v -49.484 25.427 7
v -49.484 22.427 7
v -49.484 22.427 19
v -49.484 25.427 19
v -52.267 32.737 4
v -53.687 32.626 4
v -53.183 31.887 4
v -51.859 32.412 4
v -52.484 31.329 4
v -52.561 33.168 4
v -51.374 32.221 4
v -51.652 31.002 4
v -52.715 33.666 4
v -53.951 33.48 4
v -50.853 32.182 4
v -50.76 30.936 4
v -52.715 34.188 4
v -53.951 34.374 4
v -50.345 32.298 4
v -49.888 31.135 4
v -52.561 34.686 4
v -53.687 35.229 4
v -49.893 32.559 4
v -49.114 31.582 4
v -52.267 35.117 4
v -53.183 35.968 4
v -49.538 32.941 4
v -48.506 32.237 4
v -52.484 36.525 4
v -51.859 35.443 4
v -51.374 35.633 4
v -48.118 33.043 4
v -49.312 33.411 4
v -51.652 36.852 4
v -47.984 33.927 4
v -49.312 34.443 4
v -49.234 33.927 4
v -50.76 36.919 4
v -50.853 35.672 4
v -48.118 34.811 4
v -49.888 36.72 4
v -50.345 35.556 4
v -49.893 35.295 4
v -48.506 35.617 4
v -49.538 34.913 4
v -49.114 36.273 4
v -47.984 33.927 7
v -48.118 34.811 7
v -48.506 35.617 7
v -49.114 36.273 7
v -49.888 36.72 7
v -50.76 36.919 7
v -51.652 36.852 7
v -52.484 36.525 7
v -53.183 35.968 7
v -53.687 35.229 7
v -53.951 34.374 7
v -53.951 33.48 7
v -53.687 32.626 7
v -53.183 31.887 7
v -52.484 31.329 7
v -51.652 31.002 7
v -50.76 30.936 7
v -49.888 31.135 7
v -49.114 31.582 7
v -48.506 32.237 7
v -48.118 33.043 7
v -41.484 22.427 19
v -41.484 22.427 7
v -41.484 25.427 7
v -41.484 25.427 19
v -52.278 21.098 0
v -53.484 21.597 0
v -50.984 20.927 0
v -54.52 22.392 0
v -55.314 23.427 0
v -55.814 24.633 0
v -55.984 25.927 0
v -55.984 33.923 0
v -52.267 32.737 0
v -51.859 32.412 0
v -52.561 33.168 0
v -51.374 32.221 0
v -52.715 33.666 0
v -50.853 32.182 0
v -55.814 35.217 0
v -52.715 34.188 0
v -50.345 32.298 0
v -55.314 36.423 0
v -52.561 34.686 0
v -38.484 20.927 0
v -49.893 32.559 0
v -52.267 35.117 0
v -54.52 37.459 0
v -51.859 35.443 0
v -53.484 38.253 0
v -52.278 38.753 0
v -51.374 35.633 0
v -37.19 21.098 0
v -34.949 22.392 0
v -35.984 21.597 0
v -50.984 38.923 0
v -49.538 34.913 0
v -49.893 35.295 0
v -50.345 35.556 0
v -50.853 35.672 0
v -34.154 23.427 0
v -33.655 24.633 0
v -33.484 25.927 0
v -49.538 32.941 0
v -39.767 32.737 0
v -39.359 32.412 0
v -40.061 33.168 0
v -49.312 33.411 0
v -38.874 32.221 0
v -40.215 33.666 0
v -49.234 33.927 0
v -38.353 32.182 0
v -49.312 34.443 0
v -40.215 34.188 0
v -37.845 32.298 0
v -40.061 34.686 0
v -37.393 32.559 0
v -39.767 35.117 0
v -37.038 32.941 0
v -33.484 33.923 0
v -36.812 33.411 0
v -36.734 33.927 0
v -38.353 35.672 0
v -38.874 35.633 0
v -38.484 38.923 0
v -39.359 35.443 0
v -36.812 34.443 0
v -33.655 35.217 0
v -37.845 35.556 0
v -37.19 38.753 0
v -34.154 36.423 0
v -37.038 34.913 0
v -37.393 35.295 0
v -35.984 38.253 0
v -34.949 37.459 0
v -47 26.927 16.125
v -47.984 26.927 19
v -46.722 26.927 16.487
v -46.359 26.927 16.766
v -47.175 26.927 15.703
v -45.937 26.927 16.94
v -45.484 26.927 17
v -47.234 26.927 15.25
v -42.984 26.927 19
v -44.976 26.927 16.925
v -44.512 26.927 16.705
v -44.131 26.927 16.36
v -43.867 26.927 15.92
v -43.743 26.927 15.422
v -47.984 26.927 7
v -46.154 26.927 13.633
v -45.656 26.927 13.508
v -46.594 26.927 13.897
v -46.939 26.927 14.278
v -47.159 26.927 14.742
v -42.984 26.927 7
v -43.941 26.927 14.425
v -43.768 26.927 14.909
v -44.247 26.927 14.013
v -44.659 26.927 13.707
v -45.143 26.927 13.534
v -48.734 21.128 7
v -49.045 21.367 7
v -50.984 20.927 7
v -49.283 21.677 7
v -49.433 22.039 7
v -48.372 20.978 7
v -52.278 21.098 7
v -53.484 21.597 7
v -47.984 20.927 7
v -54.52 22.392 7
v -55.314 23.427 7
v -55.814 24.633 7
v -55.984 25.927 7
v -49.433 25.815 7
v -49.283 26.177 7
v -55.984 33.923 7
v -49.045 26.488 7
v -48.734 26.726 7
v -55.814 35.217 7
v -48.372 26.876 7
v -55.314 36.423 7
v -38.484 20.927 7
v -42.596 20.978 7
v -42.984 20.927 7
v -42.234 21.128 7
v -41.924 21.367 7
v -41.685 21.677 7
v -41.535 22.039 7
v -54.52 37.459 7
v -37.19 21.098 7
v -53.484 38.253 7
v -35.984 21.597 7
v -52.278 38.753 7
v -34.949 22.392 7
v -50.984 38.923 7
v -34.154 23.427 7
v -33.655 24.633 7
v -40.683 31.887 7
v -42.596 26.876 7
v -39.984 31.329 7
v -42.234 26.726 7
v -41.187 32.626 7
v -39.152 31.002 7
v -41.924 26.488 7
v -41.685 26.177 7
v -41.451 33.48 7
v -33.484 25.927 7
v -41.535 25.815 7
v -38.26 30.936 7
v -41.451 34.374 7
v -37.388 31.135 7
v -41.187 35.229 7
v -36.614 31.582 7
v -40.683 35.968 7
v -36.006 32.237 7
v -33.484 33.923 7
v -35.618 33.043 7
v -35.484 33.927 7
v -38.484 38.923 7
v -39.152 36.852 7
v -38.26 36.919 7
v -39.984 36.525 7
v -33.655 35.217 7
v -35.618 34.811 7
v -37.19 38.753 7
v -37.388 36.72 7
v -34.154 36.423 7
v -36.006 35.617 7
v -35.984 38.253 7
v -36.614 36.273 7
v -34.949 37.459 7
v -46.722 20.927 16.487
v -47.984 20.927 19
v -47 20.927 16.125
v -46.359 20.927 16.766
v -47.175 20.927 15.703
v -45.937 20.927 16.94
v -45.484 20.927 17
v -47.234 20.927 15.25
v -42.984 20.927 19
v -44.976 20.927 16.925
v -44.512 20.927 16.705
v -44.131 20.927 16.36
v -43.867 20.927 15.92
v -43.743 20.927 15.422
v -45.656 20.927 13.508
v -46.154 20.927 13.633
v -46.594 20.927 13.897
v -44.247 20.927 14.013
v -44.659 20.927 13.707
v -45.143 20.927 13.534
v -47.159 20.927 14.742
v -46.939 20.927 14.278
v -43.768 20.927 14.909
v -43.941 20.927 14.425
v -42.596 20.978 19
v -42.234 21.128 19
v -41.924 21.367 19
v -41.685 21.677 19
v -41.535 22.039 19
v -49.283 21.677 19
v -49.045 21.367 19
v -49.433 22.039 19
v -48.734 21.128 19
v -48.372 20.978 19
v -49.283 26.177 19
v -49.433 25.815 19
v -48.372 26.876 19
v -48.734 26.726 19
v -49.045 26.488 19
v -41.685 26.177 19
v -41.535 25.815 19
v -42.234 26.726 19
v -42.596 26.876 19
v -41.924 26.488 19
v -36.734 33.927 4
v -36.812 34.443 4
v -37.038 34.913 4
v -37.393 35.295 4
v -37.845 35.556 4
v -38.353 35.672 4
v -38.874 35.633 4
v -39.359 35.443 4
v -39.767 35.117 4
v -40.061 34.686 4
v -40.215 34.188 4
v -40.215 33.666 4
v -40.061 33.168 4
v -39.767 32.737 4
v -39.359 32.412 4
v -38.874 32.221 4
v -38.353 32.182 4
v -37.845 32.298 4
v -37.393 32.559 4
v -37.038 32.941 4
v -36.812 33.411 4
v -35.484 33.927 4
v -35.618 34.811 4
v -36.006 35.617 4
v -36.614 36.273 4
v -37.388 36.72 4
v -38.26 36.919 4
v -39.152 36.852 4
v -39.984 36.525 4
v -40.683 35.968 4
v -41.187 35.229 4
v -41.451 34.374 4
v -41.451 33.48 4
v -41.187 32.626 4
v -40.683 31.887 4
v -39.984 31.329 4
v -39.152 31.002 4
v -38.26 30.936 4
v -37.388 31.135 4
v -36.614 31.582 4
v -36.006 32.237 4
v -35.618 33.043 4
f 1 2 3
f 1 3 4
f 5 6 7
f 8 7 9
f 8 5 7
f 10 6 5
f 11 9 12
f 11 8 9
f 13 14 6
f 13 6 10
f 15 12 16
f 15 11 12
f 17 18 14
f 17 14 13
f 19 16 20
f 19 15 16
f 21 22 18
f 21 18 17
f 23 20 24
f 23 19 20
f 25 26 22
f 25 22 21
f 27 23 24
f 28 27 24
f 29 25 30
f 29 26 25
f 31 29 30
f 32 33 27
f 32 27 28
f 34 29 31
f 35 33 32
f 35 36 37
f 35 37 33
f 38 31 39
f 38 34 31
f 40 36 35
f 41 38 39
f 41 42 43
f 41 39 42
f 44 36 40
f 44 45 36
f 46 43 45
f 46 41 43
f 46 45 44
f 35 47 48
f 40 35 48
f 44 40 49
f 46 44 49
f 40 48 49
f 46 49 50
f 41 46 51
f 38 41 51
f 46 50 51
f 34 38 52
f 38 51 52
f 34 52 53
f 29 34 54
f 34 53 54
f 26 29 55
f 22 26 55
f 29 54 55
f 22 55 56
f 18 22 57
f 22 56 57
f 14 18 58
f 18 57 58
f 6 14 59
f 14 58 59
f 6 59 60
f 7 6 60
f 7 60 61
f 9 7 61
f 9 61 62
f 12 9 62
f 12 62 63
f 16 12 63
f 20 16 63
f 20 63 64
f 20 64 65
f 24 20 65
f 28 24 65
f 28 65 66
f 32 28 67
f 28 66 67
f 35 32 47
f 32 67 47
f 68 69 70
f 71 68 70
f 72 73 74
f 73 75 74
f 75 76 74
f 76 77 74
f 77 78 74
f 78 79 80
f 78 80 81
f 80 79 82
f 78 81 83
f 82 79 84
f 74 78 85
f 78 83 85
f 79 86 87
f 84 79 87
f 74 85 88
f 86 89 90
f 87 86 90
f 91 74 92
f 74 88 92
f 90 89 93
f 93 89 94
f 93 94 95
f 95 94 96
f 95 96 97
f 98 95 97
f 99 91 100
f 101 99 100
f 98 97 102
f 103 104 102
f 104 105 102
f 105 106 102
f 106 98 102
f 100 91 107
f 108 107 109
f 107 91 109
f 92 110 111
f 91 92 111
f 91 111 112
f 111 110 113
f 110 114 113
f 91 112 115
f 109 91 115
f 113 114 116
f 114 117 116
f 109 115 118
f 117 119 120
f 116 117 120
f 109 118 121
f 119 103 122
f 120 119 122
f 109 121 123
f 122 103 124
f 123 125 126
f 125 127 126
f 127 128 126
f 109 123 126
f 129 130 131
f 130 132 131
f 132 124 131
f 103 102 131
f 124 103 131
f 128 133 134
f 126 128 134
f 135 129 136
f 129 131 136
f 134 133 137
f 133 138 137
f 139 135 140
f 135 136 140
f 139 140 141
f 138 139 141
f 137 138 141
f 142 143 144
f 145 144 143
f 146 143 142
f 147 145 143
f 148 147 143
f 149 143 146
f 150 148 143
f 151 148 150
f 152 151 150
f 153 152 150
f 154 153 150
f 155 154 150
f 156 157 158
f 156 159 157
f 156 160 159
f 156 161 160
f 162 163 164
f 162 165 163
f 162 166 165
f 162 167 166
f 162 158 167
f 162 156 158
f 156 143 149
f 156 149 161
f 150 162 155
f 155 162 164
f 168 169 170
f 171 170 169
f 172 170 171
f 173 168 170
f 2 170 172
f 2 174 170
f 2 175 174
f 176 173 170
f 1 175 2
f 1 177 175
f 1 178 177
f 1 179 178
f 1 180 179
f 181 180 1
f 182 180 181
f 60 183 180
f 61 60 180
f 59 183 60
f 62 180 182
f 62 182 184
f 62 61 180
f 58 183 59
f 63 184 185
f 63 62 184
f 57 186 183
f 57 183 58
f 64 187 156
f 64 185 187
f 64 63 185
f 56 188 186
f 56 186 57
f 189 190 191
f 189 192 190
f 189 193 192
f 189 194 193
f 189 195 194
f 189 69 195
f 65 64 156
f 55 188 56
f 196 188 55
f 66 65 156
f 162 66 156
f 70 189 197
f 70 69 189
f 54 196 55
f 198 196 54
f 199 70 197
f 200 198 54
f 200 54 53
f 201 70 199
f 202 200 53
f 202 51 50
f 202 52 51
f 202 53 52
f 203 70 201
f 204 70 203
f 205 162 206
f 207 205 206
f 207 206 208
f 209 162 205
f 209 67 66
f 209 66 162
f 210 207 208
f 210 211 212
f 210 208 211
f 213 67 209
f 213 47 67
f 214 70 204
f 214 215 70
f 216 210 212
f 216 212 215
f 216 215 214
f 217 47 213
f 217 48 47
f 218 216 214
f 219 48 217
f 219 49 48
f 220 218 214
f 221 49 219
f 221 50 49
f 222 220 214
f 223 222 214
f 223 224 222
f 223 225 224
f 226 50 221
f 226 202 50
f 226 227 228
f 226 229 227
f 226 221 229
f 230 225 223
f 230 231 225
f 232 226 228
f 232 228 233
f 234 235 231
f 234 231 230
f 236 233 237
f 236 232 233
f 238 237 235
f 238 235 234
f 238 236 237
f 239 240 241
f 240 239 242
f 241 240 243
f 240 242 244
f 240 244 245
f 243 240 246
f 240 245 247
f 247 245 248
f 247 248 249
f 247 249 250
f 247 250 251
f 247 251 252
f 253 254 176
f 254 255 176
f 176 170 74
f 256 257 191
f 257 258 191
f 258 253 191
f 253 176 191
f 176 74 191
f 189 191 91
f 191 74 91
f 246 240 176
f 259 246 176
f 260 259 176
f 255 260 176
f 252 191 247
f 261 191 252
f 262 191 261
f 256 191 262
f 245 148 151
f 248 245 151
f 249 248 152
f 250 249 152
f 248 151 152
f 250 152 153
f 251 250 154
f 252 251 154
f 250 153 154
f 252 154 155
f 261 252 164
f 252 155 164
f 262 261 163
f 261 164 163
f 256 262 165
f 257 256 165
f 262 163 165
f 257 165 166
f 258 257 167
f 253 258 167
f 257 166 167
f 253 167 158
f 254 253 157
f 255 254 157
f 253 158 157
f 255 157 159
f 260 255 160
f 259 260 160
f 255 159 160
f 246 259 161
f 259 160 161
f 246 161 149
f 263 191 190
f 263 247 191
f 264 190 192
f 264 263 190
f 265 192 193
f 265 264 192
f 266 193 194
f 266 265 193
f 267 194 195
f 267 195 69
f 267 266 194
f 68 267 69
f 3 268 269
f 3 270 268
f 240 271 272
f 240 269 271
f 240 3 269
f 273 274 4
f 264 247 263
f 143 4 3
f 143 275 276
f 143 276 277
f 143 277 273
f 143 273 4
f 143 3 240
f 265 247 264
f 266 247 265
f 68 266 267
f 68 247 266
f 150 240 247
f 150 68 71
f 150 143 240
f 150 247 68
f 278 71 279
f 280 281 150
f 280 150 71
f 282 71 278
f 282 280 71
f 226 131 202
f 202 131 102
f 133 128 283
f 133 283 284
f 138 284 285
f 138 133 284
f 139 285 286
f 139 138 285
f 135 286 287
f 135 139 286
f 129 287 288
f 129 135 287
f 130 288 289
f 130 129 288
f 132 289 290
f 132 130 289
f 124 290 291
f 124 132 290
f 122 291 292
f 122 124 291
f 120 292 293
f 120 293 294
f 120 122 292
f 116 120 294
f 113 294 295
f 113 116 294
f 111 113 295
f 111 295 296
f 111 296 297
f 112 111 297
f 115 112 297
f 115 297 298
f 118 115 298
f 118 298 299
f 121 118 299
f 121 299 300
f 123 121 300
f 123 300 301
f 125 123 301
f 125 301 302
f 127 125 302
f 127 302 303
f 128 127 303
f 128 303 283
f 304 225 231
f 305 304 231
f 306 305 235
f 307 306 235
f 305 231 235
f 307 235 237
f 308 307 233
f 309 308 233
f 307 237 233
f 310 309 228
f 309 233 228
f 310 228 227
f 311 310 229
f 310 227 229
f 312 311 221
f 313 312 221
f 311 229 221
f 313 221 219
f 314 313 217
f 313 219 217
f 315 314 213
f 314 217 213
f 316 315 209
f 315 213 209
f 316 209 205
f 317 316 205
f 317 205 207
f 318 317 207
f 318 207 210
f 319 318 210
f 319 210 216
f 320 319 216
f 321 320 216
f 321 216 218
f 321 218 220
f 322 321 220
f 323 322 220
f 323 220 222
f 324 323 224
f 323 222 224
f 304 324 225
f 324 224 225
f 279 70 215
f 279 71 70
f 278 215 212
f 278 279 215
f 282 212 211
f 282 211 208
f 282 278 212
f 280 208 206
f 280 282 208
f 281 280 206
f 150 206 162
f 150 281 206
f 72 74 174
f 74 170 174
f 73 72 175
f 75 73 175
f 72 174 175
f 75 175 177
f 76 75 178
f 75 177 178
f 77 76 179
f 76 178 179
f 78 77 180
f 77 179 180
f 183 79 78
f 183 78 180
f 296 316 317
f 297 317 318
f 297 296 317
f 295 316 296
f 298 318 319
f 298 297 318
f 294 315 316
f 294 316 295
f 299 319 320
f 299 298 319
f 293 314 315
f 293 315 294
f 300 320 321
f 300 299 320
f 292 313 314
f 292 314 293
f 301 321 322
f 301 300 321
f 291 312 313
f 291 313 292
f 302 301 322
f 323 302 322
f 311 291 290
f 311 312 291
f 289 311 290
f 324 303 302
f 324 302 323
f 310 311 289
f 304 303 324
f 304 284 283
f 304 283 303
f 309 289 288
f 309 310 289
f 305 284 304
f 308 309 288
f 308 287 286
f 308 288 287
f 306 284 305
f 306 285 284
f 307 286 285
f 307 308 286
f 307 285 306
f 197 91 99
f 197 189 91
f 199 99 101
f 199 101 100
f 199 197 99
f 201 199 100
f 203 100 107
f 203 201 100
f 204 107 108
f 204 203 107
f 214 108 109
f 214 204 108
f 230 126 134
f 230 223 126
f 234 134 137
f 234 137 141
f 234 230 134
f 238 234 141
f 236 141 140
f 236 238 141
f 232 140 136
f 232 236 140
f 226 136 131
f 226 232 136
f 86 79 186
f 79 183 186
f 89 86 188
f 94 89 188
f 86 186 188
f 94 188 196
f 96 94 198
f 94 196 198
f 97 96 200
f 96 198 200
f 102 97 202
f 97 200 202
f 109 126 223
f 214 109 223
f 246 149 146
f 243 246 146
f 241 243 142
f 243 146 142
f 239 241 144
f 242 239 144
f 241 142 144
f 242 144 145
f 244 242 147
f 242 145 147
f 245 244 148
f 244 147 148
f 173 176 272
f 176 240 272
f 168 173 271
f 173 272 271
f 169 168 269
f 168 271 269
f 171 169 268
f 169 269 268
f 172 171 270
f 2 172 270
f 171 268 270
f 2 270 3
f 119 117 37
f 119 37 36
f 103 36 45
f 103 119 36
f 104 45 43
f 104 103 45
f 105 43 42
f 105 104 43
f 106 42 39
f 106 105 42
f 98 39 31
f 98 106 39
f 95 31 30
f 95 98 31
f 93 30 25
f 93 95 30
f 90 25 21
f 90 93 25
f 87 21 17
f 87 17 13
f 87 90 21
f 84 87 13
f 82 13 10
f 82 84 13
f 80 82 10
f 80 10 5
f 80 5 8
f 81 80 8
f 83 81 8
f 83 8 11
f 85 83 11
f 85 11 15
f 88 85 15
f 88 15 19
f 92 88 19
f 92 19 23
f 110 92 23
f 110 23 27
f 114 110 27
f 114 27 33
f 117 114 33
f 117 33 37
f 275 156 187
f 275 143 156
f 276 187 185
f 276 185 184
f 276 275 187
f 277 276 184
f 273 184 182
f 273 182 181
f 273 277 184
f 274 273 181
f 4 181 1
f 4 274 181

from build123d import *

# Parameters (mm, degrees)
F0_R      = 3
F0_R_2    = 1.75
F1_DEPTH  = 7
F3_DEPTH  = 5
F4_W      = 8
F4_H      = 6
F5_DEPTH  = 12
F6_R      = 1.5
F2_R      = 3
F2_R_2    = 1.75
F7_DEPTH  = 3
F8_R      = 5
F10_DEPTH = 25


# Not quite as in the source:
# - a feature names something its author has since deleted; it is built from what else it names


with BuildPart() as f1:
    # F0 (on Top) → F1 (new body)
    with BuildSketch(Plane.XY):
        with BuildLine():
            ThreePointArc((-51.1365796847, 36.9232990628), (-48.9174910641, 36.1016771789), (-47.9842549264, 33.9271686971))
            ThreePointArc((-47.9842549264, 33.9271686971), (-50.9842549264, 30.9271686971), (-53.9842549264, 33.9271686971))
            Line((-53.9842549264, 33.9271686971), (-55.9842549264, 33.9271686971))
            Line((-55.9842549264, 33.9271686971), (-55.9842549264, 28.9271686971))
            Line((-55.9842549264, 28.9271686971), (-35.9842549264, 28.9271686971))
            Line((-35.9842549264, 28.9271686971), (-35.9842549264, 25.9271686971))
            Line((-35.9842549264, 25.9271686971), (-33.4842549264, 25.9271686971))
            Line((-33.4842549264, 25.9271686971), (-33.4842549264, 33.9271686971))
            Line((-33.4842549264, 33.9271686971), (-33.4842549264, 38.9232990628))
            Line((-33.4842549264, 38.9232990628), (-35.9842549264, 38.9232990628))
            Line((-35.9842549264, 38.9232990628), (-51.1365796847, 38.9232990628))
            Line((-51.1365796847, 38.9232990628), (-51.1365796847, 36.9232990628))
        make_face()
        with Locations((-38.4842549264, 33.9271686971)):
            Circle(F0_R, mode=Mode.SUBTRACT)
        with BuildLine():
            ThreePointArc((-53.9842549264, 33.9271686971), (-53.1587634082, 35.9939325595), (-51.1365796847, 36.9232990628))
            Line((-51.1365796847, 36.9232990628), (-51.1365796847, 38.9232990628))
            Line((-51.1365796847, 38.9232990628), (-55.9842549264, 38.9232990628))
            Line((-55.9842549264, 38.9232990628), (-55.9842549264, 33.9271686971))
            Line((-55.9842549264, 33.9271686971), (-53.9842549264, 33.9271686971))
        make_face()
        Polygon((-35.9842549264, 28.9271686971), (-55.9842549264, 28.9271686971), (-55.9842549264, 25.9271686971), (-53.9842549264, 25.9271686971), (-43.9842549264, 25.9271686971), (-35.9842549264, 25.9271686971), align=None)
        with BuildLine():
            ThreePointArc((-53.9842549264, 33.9271686971), (-50.9842549264, 30.9271686971), (-47.9842549264, 33.9271686971))
            ThreePointArc((-47.9842549264, 33.9271686971), (-48.9174910641, 36.1016771789), (-51.1365796847, 36.9232990628))
            ThreePointArc((-51.1365796847, 36.9232990628), (-53.1587634082, 35.9939325595), (-53.9842549264, 33.9271686971))
        make_face()
        with Locations((-50.9842549264, 33.9271686971)):
            Circle(F0_R_2, mode=Mode.SUBTRACT)
        with Locations((-38.4842549264, 33.9271686971)):
            Circle(F0_R)
        with Locations((-38.4842549264, 33.9271686971)):
            Circle(F0_R_2, mode=Mode.SUBTRACT)
    extrude(amount=F1_DEPTH)

    # F3 (add): a face of the model
    f3_faces = [f1.faces().sort_by_distance(p)[0] for p in [
        (-44.7342549264, 25.9271686971, 3.5),
    ]]
    extrude(f3_faces, amount=F3_DEPTH)

    # F4 (on face) → F5 (join)
    with BuildSketch(Plane.XY.offset(7)):
        with Locations((-45.4842549264, 23.9271686971)):
            Rectangle(F4_W, F4_H)
    extrude(amount=F5_DEPTH)

    # F6
    f6_edges = [f1.edges().sort_by_distance(p)[0] for p in [
        (-49.484255, 20.927169, 13),
        (-41.484255, 20.927169, 13),
        (-49.484255, 26.927169, 13),
        (-41.484255, 26.927169, 13),
    ]]
    fillet(f6_edges, radius=F6_R)

    # F2 (on face) → F7 (cut)
    with BuildSketch(Plane.XY.offset(7)):
        with Locations((-50.9842549264, 33.9271686971)):
            Circle(F2_R)
        with Locations((-50.9842549264, 33.9271686971)):
            Circle(F2_R_2, mode=Mode.SUBTRACT)
        with Locations((-38.4842549264, 33.9271686971)):
            Circle(F2_R)
        with Locations((-38.4842549264, 33.9271686971)):
            Circle(F2_R_2, mode=Mode.SUBTRACT)
    extrude(amount=-F7_DEPTH, mode=Mode.SUBTRACT)

    # F8
    f8_edges = [f1.edges().sort_by_distance(p)[0] for p in [
        (-55.984255, 20.927169, 3.5),
        (-55.984255, 38.923299, 3.5),
        (-33.484255, 38.923299, 3.5),
        (-33.484255, 20.927169, 3.5),
    ]]
    fillet(f8_edges, radius=F8_R)

    # F9 (on face) → F10 (cut)
    with BuildSketch(Plane(origin=(0, 26.9271686971, 0), x_dir=(-1, 0, 0), z_dir=(0, 1, 0))):
        with BuildLine():
            ThreePointArc((45.4842549264, 17), (44.2468180594, 14.0125631329), (47.2342549264, 15.25))
            ThreePointArc((47.2342549264, 15.25), (46.7216917935, 16.4874368671), (45.4842549264, 17))
        make_face()
    extrude(amount=-F10_DEPTH, mode=Mode.SUBTRACT)


solid = f1.part
